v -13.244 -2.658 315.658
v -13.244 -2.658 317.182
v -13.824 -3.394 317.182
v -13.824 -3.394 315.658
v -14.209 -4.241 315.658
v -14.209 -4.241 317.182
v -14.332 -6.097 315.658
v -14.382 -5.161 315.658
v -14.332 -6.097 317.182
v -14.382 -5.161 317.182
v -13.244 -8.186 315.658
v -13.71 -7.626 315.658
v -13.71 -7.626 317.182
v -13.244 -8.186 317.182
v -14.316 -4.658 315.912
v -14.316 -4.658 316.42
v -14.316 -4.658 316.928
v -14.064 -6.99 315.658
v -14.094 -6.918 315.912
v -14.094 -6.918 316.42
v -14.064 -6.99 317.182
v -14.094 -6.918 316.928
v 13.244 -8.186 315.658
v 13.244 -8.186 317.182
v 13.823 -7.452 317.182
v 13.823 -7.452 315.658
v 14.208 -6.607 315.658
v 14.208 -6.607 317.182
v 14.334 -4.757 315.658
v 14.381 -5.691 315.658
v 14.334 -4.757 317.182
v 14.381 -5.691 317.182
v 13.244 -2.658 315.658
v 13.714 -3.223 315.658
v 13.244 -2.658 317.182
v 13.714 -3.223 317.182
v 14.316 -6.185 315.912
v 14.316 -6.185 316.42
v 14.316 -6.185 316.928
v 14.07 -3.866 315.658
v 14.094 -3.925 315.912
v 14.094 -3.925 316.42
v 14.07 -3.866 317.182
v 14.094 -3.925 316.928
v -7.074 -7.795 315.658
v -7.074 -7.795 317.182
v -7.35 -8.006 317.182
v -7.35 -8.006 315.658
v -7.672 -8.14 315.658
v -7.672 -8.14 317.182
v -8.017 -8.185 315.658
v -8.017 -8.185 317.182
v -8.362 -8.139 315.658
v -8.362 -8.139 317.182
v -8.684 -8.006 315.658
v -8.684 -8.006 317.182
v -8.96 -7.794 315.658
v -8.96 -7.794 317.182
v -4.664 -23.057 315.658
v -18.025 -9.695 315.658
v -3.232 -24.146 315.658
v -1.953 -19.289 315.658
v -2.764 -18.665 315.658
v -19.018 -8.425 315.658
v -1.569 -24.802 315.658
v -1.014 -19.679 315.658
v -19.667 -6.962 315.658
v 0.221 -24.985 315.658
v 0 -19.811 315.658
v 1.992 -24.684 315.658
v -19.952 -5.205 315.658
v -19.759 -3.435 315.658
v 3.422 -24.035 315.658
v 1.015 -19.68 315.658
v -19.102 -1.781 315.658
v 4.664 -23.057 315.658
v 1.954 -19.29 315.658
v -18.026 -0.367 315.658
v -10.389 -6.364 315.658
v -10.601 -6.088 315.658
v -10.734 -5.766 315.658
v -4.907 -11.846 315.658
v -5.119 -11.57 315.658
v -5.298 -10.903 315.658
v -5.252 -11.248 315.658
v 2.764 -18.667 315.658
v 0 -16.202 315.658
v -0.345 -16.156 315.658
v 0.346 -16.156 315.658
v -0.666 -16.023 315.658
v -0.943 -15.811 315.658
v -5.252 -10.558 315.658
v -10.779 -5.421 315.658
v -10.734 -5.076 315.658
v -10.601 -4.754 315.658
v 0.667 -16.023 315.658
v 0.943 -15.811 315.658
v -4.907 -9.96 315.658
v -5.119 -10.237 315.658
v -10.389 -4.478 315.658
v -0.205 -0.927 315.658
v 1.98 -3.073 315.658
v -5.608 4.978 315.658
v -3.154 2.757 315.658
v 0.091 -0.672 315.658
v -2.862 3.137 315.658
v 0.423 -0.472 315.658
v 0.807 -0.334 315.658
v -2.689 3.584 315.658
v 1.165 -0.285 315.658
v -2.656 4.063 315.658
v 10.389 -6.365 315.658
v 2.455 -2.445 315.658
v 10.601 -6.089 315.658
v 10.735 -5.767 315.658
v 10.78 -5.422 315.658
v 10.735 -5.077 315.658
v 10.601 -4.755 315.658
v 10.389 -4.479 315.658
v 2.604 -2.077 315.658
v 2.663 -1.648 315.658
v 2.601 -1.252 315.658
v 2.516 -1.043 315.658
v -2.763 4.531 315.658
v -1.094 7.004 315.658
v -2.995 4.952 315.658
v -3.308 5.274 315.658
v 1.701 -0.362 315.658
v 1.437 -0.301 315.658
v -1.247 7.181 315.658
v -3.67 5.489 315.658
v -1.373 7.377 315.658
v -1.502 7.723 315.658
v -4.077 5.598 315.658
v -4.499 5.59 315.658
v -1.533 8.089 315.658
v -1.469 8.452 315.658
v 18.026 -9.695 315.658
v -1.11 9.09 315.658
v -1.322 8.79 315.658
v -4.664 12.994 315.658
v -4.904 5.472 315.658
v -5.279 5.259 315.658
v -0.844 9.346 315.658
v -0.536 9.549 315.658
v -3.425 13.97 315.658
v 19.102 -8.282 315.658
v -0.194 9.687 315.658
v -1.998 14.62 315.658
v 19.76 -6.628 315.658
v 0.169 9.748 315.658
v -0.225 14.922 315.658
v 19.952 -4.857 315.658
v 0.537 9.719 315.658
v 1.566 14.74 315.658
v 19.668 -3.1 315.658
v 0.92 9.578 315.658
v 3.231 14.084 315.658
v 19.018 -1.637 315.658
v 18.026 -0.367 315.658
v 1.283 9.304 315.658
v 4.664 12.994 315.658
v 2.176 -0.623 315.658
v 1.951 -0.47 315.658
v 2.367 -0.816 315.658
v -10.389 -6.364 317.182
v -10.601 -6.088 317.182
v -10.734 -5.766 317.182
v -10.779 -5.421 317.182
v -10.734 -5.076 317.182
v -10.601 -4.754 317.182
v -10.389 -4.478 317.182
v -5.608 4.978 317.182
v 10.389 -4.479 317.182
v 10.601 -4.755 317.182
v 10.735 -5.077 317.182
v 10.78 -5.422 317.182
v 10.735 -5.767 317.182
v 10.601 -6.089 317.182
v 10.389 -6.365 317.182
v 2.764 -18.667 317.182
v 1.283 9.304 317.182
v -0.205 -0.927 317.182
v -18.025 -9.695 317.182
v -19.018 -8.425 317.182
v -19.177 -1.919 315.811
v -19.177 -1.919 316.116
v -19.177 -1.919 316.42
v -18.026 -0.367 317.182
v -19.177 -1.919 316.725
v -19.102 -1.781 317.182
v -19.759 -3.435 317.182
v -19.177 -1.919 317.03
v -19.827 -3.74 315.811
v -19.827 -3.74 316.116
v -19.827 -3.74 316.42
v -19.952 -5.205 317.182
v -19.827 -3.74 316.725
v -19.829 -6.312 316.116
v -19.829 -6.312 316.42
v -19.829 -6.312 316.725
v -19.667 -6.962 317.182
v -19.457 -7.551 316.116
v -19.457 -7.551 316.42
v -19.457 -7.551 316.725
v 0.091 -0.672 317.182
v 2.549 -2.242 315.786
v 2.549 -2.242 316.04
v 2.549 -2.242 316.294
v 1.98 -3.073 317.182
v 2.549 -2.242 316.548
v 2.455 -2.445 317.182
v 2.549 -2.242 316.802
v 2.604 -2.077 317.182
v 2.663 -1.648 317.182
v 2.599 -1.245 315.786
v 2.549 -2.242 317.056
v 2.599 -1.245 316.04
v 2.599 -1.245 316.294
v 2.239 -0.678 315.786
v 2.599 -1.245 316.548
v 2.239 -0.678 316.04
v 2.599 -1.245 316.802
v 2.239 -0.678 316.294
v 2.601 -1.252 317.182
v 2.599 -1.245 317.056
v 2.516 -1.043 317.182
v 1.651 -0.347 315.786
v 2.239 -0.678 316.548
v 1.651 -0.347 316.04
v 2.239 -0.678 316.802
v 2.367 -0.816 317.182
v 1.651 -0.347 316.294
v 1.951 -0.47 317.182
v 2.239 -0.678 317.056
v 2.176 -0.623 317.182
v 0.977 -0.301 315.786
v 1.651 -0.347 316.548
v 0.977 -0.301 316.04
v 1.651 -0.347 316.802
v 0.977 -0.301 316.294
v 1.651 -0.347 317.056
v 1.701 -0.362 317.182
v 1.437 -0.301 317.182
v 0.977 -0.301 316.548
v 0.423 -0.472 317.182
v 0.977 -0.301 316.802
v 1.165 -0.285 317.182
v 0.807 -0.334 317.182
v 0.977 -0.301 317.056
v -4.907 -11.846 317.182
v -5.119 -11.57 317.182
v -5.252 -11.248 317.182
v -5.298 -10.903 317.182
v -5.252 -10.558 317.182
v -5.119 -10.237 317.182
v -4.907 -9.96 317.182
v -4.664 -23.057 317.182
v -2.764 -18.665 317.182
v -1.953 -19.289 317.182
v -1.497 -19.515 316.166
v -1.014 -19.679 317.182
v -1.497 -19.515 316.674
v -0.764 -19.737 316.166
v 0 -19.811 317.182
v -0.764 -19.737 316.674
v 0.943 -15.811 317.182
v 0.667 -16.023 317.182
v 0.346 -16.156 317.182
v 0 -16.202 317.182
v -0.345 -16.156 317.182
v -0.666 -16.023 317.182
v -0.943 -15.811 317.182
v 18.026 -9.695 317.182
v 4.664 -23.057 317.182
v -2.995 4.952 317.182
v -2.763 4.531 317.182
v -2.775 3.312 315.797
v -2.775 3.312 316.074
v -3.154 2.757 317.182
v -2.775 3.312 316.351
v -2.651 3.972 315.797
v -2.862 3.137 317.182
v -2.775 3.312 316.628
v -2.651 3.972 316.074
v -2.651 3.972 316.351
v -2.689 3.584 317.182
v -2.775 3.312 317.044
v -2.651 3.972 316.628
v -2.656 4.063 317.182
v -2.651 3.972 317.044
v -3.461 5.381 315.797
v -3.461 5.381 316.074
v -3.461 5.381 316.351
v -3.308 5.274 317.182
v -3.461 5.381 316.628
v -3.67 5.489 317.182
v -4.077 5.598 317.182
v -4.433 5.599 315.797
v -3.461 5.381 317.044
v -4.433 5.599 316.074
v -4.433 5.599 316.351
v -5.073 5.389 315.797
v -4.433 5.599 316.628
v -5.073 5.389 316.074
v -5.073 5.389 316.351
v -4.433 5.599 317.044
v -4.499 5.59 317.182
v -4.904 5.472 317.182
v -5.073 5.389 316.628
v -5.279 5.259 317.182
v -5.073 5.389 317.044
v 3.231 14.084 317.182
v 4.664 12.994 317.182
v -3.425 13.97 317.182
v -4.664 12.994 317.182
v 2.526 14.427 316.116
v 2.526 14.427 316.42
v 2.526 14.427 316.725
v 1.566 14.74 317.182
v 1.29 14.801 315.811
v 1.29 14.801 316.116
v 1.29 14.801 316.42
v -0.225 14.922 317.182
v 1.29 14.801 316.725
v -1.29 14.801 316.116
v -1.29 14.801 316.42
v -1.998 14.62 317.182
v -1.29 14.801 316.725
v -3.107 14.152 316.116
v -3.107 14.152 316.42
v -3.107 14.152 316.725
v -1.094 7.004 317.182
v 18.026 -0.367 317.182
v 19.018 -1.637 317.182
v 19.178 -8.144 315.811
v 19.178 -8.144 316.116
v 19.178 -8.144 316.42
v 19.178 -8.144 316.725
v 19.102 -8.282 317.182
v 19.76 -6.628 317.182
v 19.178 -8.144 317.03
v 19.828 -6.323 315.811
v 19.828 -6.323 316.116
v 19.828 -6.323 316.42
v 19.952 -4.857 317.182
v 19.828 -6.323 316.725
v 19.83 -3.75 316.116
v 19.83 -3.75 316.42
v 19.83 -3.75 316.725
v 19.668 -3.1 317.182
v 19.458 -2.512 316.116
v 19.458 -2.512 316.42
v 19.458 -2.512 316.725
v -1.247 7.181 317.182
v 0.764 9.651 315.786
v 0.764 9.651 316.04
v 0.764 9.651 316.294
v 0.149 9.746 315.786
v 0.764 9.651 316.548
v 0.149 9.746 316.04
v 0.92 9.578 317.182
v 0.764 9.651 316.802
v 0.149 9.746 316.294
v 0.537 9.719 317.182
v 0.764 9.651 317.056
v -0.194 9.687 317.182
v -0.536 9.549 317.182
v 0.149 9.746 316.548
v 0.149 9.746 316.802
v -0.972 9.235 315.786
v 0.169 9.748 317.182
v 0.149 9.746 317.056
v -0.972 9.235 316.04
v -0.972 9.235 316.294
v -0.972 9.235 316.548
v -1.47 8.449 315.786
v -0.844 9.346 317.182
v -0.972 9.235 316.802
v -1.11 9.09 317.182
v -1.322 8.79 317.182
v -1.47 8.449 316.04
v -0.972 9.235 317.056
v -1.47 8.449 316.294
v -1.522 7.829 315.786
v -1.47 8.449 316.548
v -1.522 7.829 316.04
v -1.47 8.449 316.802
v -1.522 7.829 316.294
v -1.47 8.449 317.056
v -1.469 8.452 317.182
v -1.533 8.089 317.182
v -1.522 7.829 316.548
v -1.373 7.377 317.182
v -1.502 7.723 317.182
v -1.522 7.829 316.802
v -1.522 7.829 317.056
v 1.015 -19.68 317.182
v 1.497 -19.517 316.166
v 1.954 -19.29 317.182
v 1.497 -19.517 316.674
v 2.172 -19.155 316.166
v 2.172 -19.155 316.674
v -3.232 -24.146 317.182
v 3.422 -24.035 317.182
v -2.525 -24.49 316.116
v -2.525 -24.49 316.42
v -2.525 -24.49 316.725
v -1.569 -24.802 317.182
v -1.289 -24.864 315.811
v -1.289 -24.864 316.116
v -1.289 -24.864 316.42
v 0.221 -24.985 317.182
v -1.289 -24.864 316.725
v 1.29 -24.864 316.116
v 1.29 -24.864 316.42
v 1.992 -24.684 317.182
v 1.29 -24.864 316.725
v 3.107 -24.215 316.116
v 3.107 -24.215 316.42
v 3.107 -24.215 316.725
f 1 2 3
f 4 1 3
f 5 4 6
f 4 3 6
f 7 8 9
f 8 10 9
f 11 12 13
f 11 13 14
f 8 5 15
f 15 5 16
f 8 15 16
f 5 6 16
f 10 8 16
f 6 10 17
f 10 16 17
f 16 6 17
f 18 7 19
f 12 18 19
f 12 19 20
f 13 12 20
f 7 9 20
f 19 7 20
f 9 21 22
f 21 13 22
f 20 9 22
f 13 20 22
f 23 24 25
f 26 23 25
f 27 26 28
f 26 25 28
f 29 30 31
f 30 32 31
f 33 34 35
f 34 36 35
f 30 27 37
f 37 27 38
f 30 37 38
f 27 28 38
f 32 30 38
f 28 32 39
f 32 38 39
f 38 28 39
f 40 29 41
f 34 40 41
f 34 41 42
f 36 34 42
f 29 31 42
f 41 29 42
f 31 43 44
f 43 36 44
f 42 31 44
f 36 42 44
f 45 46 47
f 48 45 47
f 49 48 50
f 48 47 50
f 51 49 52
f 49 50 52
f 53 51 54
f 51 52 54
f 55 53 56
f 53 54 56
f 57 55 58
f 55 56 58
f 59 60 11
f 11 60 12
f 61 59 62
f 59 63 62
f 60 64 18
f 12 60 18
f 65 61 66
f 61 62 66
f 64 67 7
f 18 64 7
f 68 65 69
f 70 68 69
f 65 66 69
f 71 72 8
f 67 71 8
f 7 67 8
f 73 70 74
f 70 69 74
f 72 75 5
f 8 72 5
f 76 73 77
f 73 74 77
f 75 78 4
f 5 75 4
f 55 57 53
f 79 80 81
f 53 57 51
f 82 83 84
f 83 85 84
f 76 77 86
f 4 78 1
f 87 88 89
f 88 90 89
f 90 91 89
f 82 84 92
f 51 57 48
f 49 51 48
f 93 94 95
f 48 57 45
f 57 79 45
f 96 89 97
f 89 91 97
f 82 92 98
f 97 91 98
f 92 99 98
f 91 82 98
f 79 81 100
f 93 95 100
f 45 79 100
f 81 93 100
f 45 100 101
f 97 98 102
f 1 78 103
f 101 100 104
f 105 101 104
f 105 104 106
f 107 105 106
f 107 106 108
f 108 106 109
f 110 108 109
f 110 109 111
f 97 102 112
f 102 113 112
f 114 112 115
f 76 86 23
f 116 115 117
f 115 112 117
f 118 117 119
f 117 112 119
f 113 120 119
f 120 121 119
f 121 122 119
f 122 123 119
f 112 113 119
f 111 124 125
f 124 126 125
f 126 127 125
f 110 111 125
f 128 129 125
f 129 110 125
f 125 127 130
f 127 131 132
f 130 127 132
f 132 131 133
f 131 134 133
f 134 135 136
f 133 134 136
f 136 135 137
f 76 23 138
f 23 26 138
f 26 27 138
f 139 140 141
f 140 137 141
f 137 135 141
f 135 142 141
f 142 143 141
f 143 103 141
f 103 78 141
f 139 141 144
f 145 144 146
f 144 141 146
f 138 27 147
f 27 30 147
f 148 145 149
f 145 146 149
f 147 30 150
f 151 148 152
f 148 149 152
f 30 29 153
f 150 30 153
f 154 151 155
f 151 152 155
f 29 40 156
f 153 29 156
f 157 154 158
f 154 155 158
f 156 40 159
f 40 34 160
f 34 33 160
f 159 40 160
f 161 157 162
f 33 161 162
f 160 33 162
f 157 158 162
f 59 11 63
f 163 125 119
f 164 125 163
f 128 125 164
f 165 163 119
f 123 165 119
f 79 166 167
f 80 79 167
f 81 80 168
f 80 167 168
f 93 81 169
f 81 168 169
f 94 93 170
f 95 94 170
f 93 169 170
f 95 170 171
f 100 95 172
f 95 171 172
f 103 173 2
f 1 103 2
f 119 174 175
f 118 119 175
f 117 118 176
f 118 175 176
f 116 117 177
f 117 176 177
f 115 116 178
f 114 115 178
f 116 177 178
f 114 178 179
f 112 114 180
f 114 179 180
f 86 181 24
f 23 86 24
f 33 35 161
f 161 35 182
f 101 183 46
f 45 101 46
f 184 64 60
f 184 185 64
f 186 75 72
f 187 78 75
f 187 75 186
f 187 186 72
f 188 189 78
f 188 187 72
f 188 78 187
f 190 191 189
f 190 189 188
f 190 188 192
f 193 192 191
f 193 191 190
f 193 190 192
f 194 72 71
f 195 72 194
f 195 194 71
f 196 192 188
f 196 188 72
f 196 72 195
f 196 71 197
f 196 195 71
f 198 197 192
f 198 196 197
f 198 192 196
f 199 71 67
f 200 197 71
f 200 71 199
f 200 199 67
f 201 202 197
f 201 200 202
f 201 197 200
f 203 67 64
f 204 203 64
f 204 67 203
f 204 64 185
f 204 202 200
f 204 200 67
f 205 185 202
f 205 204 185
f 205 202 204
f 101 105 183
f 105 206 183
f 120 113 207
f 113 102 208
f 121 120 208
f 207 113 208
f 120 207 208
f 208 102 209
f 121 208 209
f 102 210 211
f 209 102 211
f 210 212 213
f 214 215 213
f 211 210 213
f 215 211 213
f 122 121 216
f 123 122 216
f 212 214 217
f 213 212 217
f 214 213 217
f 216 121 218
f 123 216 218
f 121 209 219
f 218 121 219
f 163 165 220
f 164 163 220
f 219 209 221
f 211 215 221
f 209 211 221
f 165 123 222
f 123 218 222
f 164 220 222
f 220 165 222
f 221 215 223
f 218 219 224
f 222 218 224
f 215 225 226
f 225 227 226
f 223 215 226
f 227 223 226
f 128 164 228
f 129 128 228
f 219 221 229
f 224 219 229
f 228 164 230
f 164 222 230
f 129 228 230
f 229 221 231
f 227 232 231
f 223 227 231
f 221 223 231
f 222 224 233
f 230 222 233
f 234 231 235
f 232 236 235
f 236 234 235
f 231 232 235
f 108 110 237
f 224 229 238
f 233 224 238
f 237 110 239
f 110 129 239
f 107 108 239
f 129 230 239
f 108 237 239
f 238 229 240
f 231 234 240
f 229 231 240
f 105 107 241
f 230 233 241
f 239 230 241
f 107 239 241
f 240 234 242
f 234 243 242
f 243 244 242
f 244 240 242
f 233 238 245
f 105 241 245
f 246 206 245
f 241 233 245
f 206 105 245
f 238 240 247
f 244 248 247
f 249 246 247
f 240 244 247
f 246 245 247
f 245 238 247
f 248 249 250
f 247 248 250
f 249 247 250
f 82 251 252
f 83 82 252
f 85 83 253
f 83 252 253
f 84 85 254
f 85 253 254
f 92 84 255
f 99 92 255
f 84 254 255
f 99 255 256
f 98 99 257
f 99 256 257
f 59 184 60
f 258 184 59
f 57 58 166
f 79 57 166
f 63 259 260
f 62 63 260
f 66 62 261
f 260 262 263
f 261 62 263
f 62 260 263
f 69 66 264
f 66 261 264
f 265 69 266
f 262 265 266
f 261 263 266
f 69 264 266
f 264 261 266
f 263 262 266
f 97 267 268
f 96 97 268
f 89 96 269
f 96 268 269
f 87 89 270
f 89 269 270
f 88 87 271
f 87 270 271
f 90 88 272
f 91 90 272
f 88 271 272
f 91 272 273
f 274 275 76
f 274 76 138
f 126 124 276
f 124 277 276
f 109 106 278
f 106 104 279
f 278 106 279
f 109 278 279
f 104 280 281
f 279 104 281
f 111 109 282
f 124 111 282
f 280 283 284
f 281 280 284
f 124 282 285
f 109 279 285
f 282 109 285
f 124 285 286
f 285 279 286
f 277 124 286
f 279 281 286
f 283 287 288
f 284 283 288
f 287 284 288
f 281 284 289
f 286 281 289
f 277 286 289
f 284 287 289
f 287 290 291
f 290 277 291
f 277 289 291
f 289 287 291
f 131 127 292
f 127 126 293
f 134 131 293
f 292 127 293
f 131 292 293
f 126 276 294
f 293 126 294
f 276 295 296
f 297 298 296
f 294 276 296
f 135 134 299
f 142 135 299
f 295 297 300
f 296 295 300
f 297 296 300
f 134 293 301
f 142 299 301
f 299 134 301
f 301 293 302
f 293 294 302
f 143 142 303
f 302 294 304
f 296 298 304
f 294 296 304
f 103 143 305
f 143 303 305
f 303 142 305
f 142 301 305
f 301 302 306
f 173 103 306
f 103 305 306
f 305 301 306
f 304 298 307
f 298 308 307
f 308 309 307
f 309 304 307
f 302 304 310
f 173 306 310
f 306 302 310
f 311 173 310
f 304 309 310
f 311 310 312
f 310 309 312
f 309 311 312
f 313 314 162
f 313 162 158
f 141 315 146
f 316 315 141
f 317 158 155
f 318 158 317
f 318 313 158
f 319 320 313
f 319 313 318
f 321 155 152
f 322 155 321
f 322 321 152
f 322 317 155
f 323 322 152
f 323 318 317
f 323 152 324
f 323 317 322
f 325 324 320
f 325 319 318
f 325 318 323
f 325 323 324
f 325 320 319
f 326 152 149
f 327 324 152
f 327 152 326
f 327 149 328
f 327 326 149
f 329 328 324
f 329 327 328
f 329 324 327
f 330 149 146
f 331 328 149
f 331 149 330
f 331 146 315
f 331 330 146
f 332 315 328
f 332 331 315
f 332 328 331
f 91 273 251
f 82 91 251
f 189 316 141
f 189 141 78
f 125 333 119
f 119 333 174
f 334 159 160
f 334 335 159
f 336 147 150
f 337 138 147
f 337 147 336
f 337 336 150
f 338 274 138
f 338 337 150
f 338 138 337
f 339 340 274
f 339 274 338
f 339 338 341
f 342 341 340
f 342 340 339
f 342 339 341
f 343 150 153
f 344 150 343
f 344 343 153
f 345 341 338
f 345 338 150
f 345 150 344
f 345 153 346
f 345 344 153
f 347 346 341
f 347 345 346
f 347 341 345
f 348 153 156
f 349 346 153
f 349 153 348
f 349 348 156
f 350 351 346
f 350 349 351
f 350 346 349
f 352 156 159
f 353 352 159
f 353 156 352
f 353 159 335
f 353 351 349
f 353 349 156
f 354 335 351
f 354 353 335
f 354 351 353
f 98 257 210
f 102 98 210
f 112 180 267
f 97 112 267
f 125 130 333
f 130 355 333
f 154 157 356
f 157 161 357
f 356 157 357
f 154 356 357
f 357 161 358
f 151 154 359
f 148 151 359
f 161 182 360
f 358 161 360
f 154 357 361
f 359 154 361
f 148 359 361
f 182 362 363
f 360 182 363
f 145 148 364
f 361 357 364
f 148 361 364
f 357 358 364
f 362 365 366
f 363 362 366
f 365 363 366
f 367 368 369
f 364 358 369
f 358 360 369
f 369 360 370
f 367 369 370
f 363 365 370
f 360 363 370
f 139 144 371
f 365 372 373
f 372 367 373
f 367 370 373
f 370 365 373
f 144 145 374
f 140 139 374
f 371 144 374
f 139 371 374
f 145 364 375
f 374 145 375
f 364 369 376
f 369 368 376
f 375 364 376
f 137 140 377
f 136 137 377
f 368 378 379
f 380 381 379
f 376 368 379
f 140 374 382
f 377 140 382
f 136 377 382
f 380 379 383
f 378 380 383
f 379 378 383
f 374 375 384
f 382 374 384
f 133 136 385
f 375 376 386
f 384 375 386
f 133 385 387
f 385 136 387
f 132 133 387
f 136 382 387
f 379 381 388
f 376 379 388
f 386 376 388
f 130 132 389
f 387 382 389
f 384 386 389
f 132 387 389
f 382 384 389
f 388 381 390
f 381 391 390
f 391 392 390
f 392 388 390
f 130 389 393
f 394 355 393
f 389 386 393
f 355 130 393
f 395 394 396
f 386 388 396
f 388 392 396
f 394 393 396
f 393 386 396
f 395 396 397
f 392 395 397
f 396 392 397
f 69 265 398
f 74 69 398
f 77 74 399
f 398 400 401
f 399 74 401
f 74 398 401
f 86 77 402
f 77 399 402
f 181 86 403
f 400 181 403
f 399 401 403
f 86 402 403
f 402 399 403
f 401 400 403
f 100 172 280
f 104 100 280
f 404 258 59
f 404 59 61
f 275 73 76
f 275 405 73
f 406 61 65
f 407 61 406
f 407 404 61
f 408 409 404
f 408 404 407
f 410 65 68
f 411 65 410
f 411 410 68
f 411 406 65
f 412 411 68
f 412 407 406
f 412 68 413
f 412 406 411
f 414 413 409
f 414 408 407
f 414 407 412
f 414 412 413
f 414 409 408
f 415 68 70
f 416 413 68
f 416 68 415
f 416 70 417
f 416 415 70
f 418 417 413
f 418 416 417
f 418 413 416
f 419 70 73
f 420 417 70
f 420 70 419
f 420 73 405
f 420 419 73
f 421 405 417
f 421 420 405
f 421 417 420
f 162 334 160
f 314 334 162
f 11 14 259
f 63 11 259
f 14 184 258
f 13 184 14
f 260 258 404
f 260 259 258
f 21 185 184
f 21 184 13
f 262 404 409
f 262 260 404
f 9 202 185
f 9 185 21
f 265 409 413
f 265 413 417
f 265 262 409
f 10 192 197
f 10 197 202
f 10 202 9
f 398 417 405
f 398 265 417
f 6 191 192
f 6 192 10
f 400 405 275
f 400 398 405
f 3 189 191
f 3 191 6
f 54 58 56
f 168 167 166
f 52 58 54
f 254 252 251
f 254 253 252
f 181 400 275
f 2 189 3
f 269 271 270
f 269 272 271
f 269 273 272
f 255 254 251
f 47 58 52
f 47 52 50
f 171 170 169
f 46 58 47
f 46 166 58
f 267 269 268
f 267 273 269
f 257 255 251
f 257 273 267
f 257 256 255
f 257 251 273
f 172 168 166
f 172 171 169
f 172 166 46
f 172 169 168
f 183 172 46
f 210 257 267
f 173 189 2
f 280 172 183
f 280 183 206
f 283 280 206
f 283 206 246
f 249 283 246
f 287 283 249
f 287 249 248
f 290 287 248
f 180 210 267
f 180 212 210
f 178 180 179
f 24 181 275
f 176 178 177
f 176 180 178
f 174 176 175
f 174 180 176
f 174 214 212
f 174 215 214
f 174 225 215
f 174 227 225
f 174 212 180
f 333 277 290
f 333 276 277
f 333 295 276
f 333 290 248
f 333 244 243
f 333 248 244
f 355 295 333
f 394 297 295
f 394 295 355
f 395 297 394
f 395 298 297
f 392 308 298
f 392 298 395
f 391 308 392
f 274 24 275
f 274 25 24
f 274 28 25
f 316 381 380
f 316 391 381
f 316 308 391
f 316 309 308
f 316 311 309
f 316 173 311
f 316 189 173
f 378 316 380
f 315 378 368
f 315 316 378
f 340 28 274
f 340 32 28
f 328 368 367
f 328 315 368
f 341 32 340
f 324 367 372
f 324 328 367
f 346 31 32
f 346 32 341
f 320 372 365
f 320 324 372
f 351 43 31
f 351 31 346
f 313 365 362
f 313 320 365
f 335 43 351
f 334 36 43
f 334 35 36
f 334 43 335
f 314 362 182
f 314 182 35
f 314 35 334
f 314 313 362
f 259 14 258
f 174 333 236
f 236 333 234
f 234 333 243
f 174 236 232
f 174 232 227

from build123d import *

# Parameters (mm, degrees)
INLAY_PROFILE_DEPTH = 1.524


with BuildPart() as part:
    # Sketch1 → Inlay Profile (new body)
    with BuildSketch(Plane.XY.offset(317.1825)):
        with BuildLine():
            Line((18.025571565, -0.367457164), (4.664168889, 12.994014038))
            add(Edge.make_bspline(
                [(4.664168889, 12.994014038), (4.356818389, 13.301283177), (4.023428442, 13.576107861), (3.303188568, 14.059147528), (2.921540553, 14.263277993), (2.327729087, 14.509301237), (2.125703276, 14.581569814), (1.713361811, 14.706360576), (1.502025353, 14.759048678), (0.864474651, 14.884719032), (0.434602166, 14.926131934), (0, 14.926131934)],
                knots=[0, 0, 0, 0, 0.25, 0.25, 0.5, 0.5, 0.625, 0.625, 0.75, 0.75, 1, 1, 1, 1], degree=3))
            add(Edge.make_bspline(
                [(0, 14.926131934), (-0.434565559, 14.926131934), (-0.864598328, 14.884737713), (-1.715362235, 14.717005142), (-2.129530035, 14.591455059), (-2.723303198, 14.345481802), (-2.91723014, 14.253710711), (-3.296979358, 14.050339945), (-3.483640779, 13.938135256), (-4.023200182, 13.576118838), (-4.356357054, 13.301389905), (-4.663566812, 12.994033668)],
                knots=[0, 0, 0, 0, 0.25, 0.25, 0.5, 0.5, 0.625, 0.625, 0.75, 0.75, 1, 1, 1, 1], degree=3))
            Line((-4.663566812, 12.994033668), (-18.025649465, -0.367432276))
            add(Edge.make_bspline(
                [(-18.025649465, -0.367432276), (-18.333467155, -0.67533686), (-18.606471867, -1.007956137), (-18.964627192, -1.543341075), (-19.075411795, -1.727908456), (-19.279353822, -2.109557241), (-19.372638179, -2.307251324), (-19.619790253, -2.906272044), (-19.743635222, -3.317359375), (-19.911015551, -4.162573597), (-19.953704554, -4.599216881), (-19.953952622, -5.459245308), (-19.912854372, -5.886970886), (-19.787519071, -6.525023338), (-19.734956892, -6.736784446), (-19.61063072, -7.149788503), (-19.538661355, -7.352219952), (-19.293631903, -7.947426043), (-19.090333968, -8.330215541), (-18.607972779, -9.052961748), (-18.333143835, -9.387372973), (-18.025264594, -9.695301528)],
                knots=[0, 0, 0, 0, 0.125, 0.125, 0.1875, 0.1875, 0.25, 0.25, 0.375, 0.375, 0.5, 0.5, 0.625, 0.625, 0.6875, 0.6875, 0.75, 0.75, 0.875, 0.875, 1, 1, 1, 1], degree=3))
            Line((-18.025264594, -9.695301528), (-4.663524615, -23.056904469))
            add(Edge.make_bspline(
                [(-4.663524615, -23.056904469), (-4.356310087, -23.364249214), (-4.023007479, -23.63909939), (-3.302884908, -24.122140042), (-2.921265042, -24.326244773), (-2.327500967, -24.572212863), (-2.12549016, -24.644461146), (-1.713179231, -24.769212535), (-1.501858849, -24.82188113), (-0.864378385, -24.94749901), (-0.434553406, -24.988892008), (0, -24.988892008)],
                knots=[0, 0, 0, 0, 0.25, 0.25, 0.5, 0.5, 0.625, 0.625, 0.75, 0.75, 1, 1, 1, 1], degree=3))
            add(Edge.make_bspline(
                [(0, -24.988892008), (0.434598725, -24.988892008), (0.864662427, -24.947480808), (1.715485434, -24.779696058), (2.129672534, -24.65411367), (2.723485659, -24.408109873), (2.917427142, -24.316331785), (3.29721076, -24.112960431), (3.48389071, -24.000763389), (4.02353835, -23.638788642), (4.356791056, -23.364119061), (4.664144191, -23.05686733)],
                knots=[0, 0, 0, 0, 0.25, 0.25, 0.5, 0.5, 0.625, 0.625, 0.75, 0.75, 1, 1, 1, 1], degree=3))
            Line((4.664144191, -23.05686733), (18.025583545, -9.695290931))
            add(Edge.make_bspline(
                [(18.025583545, -9.695290931), (18.333482821, -9.387431146), (18.606580042, -9.054852177), (18.964876906, -8.519511604), (19.07570919, -8.334956341), (19.279745495, -7.953324821), (19.373075727, -7.75563737), (19.620355994, -7.156630228), (19.744276575, -6.745539993), (19.911775941, -5.900292811), (19.954506627, -5.463624258), (19.954794901, -4.60354651), (19.913696633, -4.175791487), (19.788326474, -3.537687683), (19.735750086, -3.325922766), (19.611387505, -2.912908888), (19.539395757, -2.710472584), (19.294286623, -2.115252142), (19.090902314, -1.732430795), (18.608415217, -1.009737255), (18.333518116, -0.67535632), (18.025571565, -0.367457164)],
                knots=[0, 0, 0, 0, 0.125, 0.125, 0.1875, 0.1875, 0.25, 0.25, 0.375, 0.375, 0.5, 0.5, 0.625, 0.625, 0.6875, 0.6875, 0.75, 0.75, 0.875, 0.875, 1, 1, 1, 1], degree=3))
        make_face()
        with BuildLine():
            Line((2.764163115, -18.666741649), (13.243958907, -8.185849192))
            add(Edge.make_bspline(
                [(13.243958907, -8.185849192), (13.608833555, -7.821914197), (13.899676587, -7.388141491), (14.191534414, -6.683923004), (14.266383768, -6.43680018), (14.365551211, -5.933629733), (14.390147378, -5.678984441), (14.390147378, -5.42132701)],
                knots=[0, 0, 0, 0, 0.5, 0.5, 0.75, 0.75, 1, 1, 1, 1], degree=3))
            add(Edge.make_bspline(
                [(14.390147378, -5.42132701), (14.390147378, -4.906143502), (14.288977165, -4.393966558), (13.997180838, -3.689977029), (13.875278396, -3.462430015), (13.589364349, -3.036852796), (13.426546706, -2.839620383), (13.244193351, -2.657689678)],
                knots=[0, 0, 0, 0, 0.5, 0.5, 0.75, 0.75, 1, 1, 1, 1], degree=3))
            add(Edge.make_bspline(
                [(13.244193351, -2.657689678), (11.84504508, -1.258501699), (10.445900405, 0.14068981), (9.046761495, 1.539887083), (7.752789848, 2.833912707), (6.458822874, 4.127943003), (5.164865581, 5.421982981), (3.870908288, 6.716022958), (2.576957547, 8.010069489), (1.283039711, 9.304148919)],
                knots=[0, 0, 0, 0, 0.005936167, 0.005936167, 0.005936167, 0.011426139, 0.011426139, 0.011426139, 0.01691611, 0.01691611, 0.01691611, 0.01691611], degree=3))
            add(Edge.make_bspline(
                [(1.283039711, 9.304148919), (1.208451812, 9.37880166), (1.128215528, 9.445680851), (0.955177572, 9.562146218), (0.861064542, 9.612149298), (0.666716276, 9.688920917), (0.566349911, 9.716183545), (0.359200688, 9.74835085), (0.253130484, 9.752841938), (-0.059388996, 9.733662582), (-0.265779648, 9.677263143), (-0.64537994, 9.499967758), (-0.819554471, 9.379722795), (-1.123868056, 9.091145072), (-1.252509124, 8.924477208), (-1.398287945, 8.647032516), (-1.439236675, 8.548793299), (-1.500120392, 8.349062122), (-1.52065849, 8.24669022), (-1.538945102, 8.036179126), (-1.536277907, 7.931558062), (-1.507085794, 7.725573364), (-1.479946725, 7.622528868), (-1.364975159, 7.329677155), (-1.243195343, 7.153930867), (-1.093632727, 7.004481006)],
                knots=[0, 0, 0, 0, 0.0625, 0.0625, 0.125, 0.125, 0.1875, 0.1875, 0.25, 0.25, 0.375, 0.375, 0.5, 0.5, 0.625, 0.625, 0.6875, 0.6875, 0.75, 0.75, 0.8125, 0.8125, 0.875, 0.875, 1, 1, 1, 1], degree=3))
            add(Edge.make_bspline(
                [(-1.093632727, 7.004481006), (0.253348837, 5.656986284), (1.600507848, 4.309668958), (2.947696525, 2.962381313), (4.187919425, 1.722067304), (5.428183671, 0.481794636), (6.668468389, -0.758457558), (7.908753108, -1.998709755), (9.149059402, -3.238940377), (10.389379137, -4.479157555)],
                knots=[0, 0, 0, 0, 0.005715847, 0.005715847, 0.005715847, 0.010977861, 0.010977861, 0.010977861, 0.016239874, 0.016239874, 0.016239874, 0.016239874], degree=3))
            ThreePointArc((10.389379137, -4.479157555), (10.77999123, -5.422091507), (10.389424288, -6.36504416))
            Line((10.389424288, -6.36504416), (0.943369001, -15.811222968))
            ThreePointArc((0.943369001, -15.811222968), (0.000426035, -16.20180224), (-0.942511126, -15.811208956))
            Line((-0.942511126, -15.811208956), (-4.907243278, -11.846307125))
            ThreePointArc((-4.907243278, -11.846307125), (-5.297796208, -10.903342622), (-4.907161552, -9.960411971))
            add(Edge.make_bspline(
                [(-4.907161552, -9.960411971), (-4.017282762, -9.070649343), (-3.127409839, -8.180880848), (-2.237548499, -7.291100768), (-1.534518938, -6.588135406), (-0.831496023, -5.885163397), (-0.128489581, -5.182174915), (0.574516863, -4.47918643), (1.277525983, -3.776200612), (1.980431653, -3.073111364)],
                knots=[0, 0, 0, 0, 0.00377519, 0.00377519, 0.00377519, 0.006757755, 0.006757755, 0.006757755, 0.009740321, 0.009740321, 0.009740321, 0.009740321], degree=3))
            add(Edge.make_bspline(
                [(1.980431653, -3.073111364), (2.140804197, -2.912661242), (2.282926924, -2.73900393), (2.456044926, -2.449522576), (2.507357822, -2.3470096), (2.589643367, -2.13613991), (2.620897599, -2.027784662), (2.67933703, -1.692286826), (2.668256404, -1.461430231), (2.56455456, -1.136554805), (2.516796459, -1.034532881), (2.395068593, -0.842948012), (2.321446097, -0.754709164), (2.156381432, -0.600330836), (2.062934312, -0.532455362), (1.865547855, -0.421945587), (1.760257054, -0.378198331), (1.541383287, -0.314868209), (1.430053085, -0.29575808), (1.203867431, -0.280914383), (1.089027609, -0.285532444), (0.753475716, -0.332291796), (0.535040575, -0.408379414), (0.137984232, -0.6245314), (-0.043673421, -0.765401767), (-0.204860953, -0.926528537)],
                knots=[0, 0, 0, 0, 0.125, 0.125, 0.1875, 0.1875, 0.25, 0.25, 0.375, 0.375, 0.4375, 0.4375, 0.5, 0.5, 0.5625, 0.5625, 0.625, 0.625, 0.6875, 0.6875, 0.75, 0.75, 0.875, 0.875, 1, 1, 1, 1], degree=3))
            add(Edge.make_bspline(
                [(-0.204860953, -0.926528537), (-0.641101053, -1.362793519), (-1.077372199, -1.799027457), (-1.513647836, -2.235256899), (-2.440333949, -3.161844889), (-3.367052449, -4.088400488), (-4.293778224, -5.014948809), (-5.220504, -5.941497132), (-6.147239872, -6.868035357), (-7.073980722, -7.794568602)],
                knots=[0, 0, 0, 0, 0.001850863, 0.001850863, 0.001850863, 0.005782251, 0.005782251, 0.005782251, 0.009713639, 0.009713639, 0.009713639, 0.009713639], degree=3))
            ThreePointArc((-7.073980722, -7.794568602), (-8.017129764, -8.185036049), (-8.960086733, -7.794104987))
            Line((-8.960086733, -7.794104987), (-10.389194361, -6.363911994))
            ThreePointArc((-10.389194361, -6.363911994), (-10.779409558, -5.420973836), (-10.388672202, -4.478251932))
            add(Edge.make_bspline(
                [(-10.388672202, -4.478251932), (-9.620363184, -3.710210592), (-8.852080067, -2.942143342), (-8.083834335, -2.174038699), (-7.262017343, -1.352372632), (-6.440241976, -0.530664926), (-5.618537443, 0.291113605), (-4.796832885, 1.11289216), (-3.975193451, 1.934735858), (-3.153705857, 2.7567313)],
                knots=[0, 0, 0, 0, 0.003259091, 0.003259091, 0.003259091, 0.006745445, 0.006745445, 0.006745445, 0.0102318, 0.0102318, 0.0102318, 0.0102318], degree=3))
            add(Edge.make_bspline(
                [(-3.153705857, 2.7567313), (-3.073275327, 2.837120342), (-3.001018869, 2.923298121), (-2.874183174, 3.108172399), (-2.819145258, 3.207947086), (-2.731427392, 3.416662057), (-2.699146348, 3.523975917), (-2.657489826, 3.744452491), (-2.648280145, 3.858971027), (-2.662206408, 4.422495916), (-2.86542486, 4.865755486), (-3.274203407, 5.251671073), (-3.365231629, 5.321829449), (-3.556910695, 5.439619692), (-3.657999963, 5.488005812), (-3.978069809, 5.599529591), (-4.20753438, 5.624830423), (-4.545641744, 5.586274821), (-4.655458789, 5.56134804), (-4.869936225, 5.489914826), (-4.974382972, 5.443189754), (-5.269396668, 5.280222942), (-5.447707363, 5.138839656), (-5.608265037, 4.978375432)],
                knots=[0, 0, 0, 0, 0.0625, 0.0625, 0.125, 0.125, 0.1875, 0.1875, 0.25, 0.25, 0.5, 0.5, 0.5625, 0.5625, 0.625, 0.625, 0.75, 0.75, 0.8125, 0.8125, 0.875, 0.875, 1, 1, 1, 1], degree=3))
            add(Edge.make_bspline(
                [(-5.608265037, 4.978375432), (-6.419093367, 4.167567138), (-7.229912955, 3.356750104), (-8.04072861, 2.545929136), (-8.907975502, 1.67867656), (-9.775217571, 0.811419162), (-10.642456843, -0.055841034), (-11.509696114, -0.92310123), (-12.376932511, -1.7903643), (-13.244166976, -2.657629303)],
                knots=[0, 0, 0, 0, 0.003440011, 0.003440011, 0.003440011, 0.00711944, 0.00711944, 0.00711944, 0.010798869, 0.010798869, 0.010798869, 0.010798869], degree=3))
            add(Edge.make_bspline(
                [(-13.244166976, -2.657629303), (-13.608600195, -3.021827623), (-13.899427442, -3.455428378), (-14.191343401, -4.159425647), (-14.266223067, -4.406472325), (-14.365420486, -4.909539259), (-14.390010332, -5.164133807), (-14.390010332, -5.421738148)],
                knots=[0, 0, 0, 0, 0.5, 0.5, 0.75, 0.75, 1, 1, 1, 1], degree=3))
            add(Edge.make_bspline(
                [(-14.390010332, -5.421738148), (-14.390010332, -5.936941134), (-14.288825943, -6.449133342), (-13.997063, -7.153166102), (-13.875183954, -7.38072782), (-13.589321969, -7.806370664), (-13.426536962, -8.003645163), (-13.244218716, -8.185623942)],
                knots=[0, 0, 0, 0, 0.5, 0.5, 0.75, 0.75, 1, 1, 1, 1], degree=3))
            Line((-13.244218716, -8.185623942), (-2.764136748, -18.664986339))
            add(Edge.make_bspline(
                [(-2.764136748, -18.664986339), (-2.400035433, -19.029574977), (-1.966546507, -19.320649385), (-1.262547507, -19.612746574), (-1.015462867, -19.68766307), (-0.512378601, -19.786880045), (-0.257767564, -19.811465257), (-0.000142467, -19.811474386)],
                knots=[0, 0, 0, 0, 0.5, 0.5, 0.75, 0.75, 1, 1, 1, 1], degree=3))
            add(Edge.make_bspline(
                [(-0.000142467, -19.811474386), (0.515090813, -19.812034072), (1.027360033, -19.71098374), (1.731500271, -19.419371754), (1.959103087, -19.297532052), (2.384821027, -19.011767969), (2.582144098, -18.849033097), (2.764163115, -18.666741649)],
                knots=[0, 0, 0, 0, 0.5, 0.5, 0.75, 0.75, 1, 1, 1, 1], degree=3))
        make_face(mode=Mode.SUBTRACT)
    extrude(amount=-INLAY_PROFILE_DEPTH)


solid = part.part
